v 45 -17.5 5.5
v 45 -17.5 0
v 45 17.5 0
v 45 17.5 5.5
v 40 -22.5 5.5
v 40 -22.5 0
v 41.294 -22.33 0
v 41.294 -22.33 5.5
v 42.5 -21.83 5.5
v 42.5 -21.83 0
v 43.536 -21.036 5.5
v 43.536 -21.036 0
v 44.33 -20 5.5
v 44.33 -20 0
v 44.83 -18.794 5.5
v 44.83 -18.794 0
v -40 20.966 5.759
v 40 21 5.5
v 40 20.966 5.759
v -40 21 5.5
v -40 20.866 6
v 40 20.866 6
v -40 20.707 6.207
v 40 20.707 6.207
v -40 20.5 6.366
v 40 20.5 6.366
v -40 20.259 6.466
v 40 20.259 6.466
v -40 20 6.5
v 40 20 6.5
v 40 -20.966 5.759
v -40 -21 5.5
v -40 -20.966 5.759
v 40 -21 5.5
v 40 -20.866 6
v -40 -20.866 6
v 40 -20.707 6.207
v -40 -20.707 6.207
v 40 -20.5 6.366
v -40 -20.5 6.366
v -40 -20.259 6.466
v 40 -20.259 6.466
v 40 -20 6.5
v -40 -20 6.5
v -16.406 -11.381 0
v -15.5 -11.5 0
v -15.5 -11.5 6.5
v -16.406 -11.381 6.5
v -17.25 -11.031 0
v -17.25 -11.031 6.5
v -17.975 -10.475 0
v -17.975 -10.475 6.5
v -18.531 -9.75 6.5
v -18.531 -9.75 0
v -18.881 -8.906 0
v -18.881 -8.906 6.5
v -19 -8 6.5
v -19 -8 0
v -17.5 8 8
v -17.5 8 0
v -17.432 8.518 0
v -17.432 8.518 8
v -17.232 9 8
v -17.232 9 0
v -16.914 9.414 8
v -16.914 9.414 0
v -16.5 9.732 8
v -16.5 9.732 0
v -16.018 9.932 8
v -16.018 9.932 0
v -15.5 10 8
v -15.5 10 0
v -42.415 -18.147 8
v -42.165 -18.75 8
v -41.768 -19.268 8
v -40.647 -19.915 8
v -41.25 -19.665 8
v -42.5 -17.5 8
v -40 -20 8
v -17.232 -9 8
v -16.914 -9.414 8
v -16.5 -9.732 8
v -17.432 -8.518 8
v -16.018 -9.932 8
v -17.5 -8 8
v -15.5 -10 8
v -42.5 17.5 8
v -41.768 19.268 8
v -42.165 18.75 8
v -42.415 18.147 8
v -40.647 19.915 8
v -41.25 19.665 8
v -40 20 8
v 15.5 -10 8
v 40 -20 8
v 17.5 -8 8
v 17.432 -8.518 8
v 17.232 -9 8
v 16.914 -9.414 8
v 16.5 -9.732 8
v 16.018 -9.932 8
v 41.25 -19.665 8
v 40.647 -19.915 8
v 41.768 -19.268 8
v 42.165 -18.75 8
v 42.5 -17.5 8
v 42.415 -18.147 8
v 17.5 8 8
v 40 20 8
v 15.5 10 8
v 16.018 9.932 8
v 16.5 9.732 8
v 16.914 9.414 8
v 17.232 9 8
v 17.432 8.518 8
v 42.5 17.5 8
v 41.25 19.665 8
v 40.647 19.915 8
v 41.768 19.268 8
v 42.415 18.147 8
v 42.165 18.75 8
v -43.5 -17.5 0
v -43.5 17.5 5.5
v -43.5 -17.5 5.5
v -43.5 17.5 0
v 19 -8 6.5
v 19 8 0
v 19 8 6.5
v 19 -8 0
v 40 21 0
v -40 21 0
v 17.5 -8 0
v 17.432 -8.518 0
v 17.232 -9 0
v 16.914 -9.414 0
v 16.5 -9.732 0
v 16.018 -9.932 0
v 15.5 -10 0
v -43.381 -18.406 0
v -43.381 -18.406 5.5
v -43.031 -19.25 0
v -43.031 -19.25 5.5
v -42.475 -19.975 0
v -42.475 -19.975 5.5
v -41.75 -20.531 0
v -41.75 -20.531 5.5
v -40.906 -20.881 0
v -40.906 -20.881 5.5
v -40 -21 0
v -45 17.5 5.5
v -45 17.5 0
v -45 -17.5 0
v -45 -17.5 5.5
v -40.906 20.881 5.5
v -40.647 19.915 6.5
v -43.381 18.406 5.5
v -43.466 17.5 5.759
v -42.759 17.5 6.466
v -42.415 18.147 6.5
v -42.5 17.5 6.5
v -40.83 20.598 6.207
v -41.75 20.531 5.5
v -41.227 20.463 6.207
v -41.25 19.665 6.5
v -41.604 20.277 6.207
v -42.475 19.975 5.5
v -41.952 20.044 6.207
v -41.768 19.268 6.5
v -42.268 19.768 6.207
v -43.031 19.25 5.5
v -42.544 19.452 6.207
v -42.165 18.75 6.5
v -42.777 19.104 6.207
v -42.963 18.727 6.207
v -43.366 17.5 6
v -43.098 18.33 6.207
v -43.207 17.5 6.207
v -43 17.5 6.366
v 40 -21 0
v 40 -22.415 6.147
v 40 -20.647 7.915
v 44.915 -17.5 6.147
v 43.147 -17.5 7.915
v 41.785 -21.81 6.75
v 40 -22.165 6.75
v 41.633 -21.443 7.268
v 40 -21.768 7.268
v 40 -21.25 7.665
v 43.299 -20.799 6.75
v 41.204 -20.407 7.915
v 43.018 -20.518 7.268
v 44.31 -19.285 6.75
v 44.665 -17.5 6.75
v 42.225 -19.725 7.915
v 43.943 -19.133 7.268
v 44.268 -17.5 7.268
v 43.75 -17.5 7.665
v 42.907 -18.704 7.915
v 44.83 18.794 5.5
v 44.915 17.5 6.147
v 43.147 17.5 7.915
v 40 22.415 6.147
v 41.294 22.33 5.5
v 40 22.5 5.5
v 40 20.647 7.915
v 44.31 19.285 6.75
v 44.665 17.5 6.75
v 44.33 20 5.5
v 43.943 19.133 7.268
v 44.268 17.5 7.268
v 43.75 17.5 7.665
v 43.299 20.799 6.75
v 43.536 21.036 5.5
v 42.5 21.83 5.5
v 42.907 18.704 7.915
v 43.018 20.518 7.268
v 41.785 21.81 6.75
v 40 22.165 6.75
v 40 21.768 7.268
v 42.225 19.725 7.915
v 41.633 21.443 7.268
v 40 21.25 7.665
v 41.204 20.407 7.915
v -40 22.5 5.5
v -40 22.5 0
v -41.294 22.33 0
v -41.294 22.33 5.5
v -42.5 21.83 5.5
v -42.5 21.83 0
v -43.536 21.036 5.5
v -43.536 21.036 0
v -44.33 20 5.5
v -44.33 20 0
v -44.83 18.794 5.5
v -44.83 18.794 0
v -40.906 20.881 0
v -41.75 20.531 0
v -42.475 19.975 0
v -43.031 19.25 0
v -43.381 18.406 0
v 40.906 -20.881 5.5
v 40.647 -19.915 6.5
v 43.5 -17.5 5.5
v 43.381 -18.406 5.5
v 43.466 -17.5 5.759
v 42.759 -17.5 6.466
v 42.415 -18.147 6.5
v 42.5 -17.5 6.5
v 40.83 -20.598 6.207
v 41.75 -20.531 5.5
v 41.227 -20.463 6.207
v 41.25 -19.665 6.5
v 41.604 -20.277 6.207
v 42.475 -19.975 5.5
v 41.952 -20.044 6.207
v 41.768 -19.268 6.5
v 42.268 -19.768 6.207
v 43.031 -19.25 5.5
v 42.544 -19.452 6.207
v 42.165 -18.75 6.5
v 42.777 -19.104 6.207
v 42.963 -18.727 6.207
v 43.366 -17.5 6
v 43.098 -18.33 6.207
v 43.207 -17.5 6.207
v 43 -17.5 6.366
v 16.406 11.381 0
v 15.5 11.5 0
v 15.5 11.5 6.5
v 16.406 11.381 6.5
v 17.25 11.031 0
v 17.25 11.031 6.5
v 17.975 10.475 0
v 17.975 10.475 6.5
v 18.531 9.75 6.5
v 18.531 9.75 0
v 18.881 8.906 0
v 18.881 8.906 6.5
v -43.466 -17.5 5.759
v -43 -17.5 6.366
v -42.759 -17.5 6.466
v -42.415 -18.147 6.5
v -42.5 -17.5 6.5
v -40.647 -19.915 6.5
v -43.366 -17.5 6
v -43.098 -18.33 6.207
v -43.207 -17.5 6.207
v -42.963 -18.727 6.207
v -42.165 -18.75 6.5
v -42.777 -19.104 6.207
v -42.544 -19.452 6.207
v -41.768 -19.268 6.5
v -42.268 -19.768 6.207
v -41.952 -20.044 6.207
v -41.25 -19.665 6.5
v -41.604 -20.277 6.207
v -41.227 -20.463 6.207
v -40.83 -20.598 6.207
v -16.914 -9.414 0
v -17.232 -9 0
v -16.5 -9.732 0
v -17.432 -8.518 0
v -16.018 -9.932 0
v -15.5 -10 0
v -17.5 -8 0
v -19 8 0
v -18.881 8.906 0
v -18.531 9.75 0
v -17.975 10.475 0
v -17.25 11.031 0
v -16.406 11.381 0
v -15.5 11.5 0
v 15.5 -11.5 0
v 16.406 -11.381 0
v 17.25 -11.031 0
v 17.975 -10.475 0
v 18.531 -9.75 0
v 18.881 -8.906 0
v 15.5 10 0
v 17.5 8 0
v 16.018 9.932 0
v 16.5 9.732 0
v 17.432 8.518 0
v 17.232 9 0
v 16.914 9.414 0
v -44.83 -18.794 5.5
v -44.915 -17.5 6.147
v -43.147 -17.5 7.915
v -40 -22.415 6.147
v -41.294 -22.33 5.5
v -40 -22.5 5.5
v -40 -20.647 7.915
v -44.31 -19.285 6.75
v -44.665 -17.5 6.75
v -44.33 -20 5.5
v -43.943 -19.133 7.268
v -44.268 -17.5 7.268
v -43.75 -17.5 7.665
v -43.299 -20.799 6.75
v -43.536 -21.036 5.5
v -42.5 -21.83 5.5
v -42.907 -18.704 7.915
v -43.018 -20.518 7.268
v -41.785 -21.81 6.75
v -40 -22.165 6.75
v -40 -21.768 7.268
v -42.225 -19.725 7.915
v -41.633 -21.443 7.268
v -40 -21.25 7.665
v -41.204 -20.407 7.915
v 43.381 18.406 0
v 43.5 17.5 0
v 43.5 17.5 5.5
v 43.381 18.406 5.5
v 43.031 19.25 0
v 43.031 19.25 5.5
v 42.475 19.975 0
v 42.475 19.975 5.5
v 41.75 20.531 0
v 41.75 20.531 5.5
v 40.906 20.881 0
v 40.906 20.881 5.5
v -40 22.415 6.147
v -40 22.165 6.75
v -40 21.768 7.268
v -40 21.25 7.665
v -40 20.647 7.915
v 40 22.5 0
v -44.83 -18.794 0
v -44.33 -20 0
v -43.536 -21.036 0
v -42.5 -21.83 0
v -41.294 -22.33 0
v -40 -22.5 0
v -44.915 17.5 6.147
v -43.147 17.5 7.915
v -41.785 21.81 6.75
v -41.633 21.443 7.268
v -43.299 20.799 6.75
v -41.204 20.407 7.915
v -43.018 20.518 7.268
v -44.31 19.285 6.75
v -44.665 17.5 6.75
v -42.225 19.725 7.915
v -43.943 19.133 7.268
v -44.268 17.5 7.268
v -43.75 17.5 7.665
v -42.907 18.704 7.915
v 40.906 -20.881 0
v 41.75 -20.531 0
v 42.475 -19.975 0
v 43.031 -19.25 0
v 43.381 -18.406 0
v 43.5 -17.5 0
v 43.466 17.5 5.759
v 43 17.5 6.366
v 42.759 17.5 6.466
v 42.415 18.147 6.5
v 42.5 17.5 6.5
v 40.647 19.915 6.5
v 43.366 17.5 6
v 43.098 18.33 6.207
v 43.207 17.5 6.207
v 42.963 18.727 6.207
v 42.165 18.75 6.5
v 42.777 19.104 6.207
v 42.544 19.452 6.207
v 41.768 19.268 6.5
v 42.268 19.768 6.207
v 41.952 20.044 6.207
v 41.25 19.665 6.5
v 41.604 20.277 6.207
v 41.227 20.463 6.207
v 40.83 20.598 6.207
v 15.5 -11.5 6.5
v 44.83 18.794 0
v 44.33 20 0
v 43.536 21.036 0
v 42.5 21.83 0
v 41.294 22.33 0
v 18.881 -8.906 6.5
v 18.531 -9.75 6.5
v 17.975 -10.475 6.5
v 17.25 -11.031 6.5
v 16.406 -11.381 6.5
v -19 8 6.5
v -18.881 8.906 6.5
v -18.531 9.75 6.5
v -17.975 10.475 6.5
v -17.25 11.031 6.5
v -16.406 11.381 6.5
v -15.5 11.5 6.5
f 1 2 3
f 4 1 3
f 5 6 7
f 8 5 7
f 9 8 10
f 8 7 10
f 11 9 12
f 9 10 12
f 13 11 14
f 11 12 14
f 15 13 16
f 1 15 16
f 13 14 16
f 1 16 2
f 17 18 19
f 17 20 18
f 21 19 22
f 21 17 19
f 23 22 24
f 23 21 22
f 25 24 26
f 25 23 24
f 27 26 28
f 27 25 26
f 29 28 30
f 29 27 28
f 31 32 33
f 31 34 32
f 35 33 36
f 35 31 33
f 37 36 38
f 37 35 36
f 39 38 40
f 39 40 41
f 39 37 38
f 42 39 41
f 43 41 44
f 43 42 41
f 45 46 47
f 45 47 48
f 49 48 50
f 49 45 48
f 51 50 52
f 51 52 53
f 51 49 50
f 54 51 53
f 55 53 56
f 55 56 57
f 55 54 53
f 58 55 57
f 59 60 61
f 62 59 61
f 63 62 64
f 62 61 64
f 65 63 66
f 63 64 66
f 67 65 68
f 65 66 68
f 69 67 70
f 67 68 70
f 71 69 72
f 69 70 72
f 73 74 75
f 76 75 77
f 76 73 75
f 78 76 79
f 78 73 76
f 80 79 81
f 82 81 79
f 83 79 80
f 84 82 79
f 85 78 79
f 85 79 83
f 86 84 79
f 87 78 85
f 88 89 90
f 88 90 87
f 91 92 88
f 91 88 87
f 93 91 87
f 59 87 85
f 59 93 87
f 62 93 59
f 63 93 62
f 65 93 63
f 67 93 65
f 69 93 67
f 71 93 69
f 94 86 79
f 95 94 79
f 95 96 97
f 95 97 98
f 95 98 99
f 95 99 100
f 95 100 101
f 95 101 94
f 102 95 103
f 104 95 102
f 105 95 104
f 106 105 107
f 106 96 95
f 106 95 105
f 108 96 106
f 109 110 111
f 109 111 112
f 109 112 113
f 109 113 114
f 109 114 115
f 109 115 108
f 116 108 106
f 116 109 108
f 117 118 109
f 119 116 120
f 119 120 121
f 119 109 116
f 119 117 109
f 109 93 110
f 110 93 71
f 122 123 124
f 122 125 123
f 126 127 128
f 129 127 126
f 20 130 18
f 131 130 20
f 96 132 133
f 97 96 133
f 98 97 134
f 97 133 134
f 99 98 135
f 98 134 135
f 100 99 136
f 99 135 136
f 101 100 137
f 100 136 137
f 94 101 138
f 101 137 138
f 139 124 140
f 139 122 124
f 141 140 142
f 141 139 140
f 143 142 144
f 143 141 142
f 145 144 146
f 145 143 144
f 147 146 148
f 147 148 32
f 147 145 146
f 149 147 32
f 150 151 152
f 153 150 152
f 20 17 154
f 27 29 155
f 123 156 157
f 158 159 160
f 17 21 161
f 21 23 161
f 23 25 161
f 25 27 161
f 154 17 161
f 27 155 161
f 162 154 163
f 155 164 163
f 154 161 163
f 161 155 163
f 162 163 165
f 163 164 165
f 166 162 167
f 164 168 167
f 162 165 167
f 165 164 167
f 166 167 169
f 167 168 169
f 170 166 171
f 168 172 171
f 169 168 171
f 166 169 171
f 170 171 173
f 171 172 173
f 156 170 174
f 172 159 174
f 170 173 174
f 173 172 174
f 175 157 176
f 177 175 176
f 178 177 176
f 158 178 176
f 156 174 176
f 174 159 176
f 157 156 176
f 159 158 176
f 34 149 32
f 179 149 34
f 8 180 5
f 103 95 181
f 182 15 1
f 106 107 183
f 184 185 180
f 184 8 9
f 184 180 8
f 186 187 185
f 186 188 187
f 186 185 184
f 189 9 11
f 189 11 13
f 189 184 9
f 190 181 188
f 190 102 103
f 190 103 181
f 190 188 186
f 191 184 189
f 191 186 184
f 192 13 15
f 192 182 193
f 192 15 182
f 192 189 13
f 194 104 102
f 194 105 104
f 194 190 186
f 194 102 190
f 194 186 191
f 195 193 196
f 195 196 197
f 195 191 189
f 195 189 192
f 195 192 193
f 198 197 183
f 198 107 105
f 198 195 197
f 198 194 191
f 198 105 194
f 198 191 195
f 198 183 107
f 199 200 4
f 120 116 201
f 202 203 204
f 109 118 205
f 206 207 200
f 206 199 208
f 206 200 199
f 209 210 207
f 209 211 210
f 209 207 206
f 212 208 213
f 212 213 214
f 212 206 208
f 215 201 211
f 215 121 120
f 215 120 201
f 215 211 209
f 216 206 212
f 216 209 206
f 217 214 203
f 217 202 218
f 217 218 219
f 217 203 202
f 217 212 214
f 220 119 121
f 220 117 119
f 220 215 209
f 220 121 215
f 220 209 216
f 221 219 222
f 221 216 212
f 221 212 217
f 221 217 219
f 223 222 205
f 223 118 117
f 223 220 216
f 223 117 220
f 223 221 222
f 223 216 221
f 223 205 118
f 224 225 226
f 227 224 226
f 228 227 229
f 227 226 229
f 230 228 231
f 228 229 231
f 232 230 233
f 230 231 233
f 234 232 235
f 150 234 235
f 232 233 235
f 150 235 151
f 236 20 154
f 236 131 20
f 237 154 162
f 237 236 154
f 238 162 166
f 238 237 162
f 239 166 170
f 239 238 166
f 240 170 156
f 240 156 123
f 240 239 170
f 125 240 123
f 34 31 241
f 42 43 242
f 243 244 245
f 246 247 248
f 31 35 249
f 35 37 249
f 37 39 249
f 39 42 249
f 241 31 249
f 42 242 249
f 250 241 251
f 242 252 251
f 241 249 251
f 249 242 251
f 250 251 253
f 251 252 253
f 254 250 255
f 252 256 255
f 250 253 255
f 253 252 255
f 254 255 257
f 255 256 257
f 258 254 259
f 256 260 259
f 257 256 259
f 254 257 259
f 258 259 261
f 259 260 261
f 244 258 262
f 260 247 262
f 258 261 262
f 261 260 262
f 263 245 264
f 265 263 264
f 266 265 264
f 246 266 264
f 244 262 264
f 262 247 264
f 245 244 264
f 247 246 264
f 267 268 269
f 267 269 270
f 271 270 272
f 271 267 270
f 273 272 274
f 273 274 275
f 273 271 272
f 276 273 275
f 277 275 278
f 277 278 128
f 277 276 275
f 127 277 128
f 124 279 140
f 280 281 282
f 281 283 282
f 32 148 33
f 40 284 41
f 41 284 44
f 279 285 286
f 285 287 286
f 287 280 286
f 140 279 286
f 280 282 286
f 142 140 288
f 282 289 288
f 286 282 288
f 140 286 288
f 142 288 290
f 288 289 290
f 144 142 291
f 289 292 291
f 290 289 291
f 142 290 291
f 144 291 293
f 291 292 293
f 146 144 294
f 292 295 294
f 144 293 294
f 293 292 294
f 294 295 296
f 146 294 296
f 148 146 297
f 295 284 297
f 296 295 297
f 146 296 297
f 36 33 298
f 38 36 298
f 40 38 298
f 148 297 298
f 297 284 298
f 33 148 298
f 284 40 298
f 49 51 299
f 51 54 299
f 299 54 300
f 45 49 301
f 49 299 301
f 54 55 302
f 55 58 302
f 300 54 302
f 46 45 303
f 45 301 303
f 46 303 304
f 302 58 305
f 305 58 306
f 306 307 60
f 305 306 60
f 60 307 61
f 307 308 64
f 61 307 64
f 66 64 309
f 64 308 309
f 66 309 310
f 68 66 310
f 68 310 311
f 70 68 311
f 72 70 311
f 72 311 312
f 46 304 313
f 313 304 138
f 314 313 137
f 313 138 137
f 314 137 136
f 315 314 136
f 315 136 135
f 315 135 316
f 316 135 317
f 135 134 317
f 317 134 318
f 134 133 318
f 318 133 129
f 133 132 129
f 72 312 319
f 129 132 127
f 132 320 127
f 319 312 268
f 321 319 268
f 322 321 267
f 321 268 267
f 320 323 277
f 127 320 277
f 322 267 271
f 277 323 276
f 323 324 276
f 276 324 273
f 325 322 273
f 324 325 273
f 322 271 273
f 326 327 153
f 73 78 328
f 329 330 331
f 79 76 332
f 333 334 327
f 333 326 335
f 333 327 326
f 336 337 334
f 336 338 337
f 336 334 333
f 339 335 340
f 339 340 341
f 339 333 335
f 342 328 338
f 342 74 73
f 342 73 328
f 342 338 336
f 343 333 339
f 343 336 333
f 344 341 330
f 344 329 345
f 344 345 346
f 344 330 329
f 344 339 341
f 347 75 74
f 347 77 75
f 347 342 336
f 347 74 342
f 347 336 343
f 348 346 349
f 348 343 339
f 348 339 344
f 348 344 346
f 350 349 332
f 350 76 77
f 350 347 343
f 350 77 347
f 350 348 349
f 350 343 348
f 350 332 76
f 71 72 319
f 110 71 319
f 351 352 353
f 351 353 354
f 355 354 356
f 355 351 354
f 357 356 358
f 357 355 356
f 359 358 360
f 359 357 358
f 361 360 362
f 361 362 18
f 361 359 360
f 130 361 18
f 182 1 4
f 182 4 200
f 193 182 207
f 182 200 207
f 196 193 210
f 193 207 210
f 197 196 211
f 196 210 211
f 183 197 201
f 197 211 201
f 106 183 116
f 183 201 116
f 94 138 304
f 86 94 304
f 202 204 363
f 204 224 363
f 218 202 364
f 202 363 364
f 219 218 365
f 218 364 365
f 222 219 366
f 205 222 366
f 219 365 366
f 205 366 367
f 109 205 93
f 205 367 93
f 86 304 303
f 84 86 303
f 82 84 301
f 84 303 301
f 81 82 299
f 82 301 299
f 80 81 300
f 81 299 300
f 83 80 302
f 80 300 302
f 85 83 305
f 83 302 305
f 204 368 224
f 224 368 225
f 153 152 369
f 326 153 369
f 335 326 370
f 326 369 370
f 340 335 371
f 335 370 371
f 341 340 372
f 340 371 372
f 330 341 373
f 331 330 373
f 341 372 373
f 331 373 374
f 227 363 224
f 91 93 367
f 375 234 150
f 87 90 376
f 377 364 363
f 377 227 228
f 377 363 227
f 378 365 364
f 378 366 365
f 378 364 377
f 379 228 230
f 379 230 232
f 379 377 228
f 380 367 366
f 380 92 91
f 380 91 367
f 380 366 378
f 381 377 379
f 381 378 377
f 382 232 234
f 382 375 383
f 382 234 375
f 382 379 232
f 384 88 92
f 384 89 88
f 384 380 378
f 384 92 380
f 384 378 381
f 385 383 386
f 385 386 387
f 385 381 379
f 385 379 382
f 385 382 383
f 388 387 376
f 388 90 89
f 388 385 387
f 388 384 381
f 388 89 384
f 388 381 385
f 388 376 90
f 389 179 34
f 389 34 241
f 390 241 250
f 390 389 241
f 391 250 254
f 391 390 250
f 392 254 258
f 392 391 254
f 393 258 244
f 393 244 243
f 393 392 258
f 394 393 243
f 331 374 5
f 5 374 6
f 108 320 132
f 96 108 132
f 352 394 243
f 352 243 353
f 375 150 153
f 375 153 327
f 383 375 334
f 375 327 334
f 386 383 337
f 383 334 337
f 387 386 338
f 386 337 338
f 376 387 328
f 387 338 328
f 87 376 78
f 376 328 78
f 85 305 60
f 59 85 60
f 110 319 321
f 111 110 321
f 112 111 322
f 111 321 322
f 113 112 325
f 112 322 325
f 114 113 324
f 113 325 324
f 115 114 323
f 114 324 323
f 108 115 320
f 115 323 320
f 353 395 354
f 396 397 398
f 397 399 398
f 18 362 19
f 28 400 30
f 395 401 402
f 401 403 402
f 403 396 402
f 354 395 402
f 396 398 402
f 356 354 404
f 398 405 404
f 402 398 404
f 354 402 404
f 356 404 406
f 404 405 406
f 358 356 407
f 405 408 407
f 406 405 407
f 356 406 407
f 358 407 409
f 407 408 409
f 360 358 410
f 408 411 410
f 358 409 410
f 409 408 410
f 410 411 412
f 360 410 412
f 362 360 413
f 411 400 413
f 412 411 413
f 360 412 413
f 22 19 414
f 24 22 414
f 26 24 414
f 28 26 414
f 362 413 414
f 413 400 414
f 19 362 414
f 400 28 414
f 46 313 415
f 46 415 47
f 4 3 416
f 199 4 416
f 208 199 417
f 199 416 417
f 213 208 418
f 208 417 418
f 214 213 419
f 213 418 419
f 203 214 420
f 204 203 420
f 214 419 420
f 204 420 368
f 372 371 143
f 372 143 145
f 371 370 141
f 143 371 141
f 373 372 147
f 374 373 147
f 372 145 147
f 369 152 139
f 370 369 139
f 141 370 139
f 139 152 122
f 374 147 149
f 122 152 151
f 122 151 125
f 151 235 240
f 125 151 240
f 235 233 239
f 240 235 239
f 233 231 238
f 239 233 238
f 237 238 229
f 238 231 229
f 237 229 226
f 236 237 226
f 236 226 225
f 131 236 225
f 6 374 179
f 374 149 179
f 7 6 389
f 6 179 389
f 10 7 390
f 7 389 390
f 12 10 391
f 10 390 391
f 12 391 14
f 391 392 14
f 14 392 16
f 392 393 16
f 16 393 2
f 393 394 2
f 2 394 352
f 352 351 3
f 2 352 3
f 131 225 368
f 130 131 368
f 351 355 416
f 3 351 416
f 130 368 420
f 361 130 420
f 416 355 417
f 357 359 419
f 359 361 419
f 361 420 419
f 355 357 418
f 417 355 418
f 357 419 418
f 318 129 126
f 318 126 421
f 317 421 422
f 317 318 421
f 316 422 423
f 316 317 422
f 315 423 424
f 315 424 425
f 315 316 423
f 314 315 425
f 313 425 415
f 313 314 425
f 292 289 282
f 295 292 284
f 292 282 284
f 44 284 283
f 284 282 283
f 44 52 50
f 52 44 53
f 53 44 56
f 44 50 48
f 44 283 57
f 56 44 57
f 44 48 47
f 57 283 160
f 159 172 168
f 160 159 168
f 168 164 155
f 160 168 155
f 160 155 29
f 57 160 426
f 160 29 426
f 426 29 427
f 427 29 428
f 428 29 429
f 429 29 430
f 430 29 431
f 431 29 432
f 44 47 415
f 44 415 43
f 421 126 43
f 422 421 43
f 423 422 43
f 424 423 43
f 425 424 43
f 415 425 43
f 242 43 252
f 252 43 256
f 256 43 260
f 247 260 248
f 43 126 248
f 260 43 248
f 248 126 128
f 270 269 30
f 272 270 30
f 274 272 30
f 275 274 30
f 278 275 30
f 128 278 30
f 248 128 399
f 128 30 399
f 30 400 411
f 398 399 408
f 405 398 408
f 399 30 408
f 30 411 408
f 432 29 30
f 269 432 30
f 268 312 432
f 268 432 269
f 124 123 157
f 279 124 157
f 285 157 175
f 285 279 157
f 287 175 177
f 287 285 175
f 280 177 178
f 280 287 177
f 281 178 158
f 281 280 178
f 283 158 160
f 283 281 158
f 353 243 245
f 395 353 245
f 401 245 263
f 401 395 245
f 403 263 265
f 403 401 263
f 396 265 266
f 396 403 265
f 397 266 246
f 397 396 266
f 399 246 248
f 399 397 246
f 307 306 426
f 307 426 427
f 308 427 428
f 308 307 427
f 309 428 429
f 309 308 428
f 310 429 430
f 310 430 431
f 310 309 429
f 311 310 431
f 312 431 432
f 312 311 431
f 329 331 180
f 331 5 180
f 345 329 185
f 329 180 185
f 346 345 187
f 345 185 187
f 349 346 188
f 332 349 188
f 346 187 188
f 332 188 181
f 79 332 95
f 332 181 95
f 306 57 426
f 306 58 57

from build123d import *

# Parameters (mm, degrees)
F1_DEPTH = 8
F2_R     = 2.5
F3_T     = -1.5


with BuildPart() as f1:
    # F0 (on Top) → F1 (new body)
    with BuildSketch(Plane.XY):
        with BuildLine():
            Line((40, 22.5), (-40, 22.5))
            ThreePointArc((-40, 22.5), (-43.535534, 21.035534), (-45, 17.5))
            Line((-45, 17.5), (-45, -17.5))
            ThreePointArc((-45, -17.5), (-43.535534, -21.035534), (-40, -22.5))
            Line((-40, -22.5), (40, -22.5))
            ThreePointArc((40, -22.5), (43.535534, -21.035534), (45, -17.5))
            Line((45, -17.5), (45, 17.5))
            ThreePointArc((45, 17.5), (43.535534, 21.035534), (40, 22.5))
        make_face()
        with BuildLine():
            ThreePointArc((-17.5, 8), (-16.914214, 9.414214), (-15.5, 10))
            Line((-15.5, 10), (15.5, 10))
            ThreePointArc((15.5, 10), (16.914214, 9.414214), (17.5, 8))
            Line((17.5, 8), (17.5, -8))
            ThreePointArc((17.5, -8), (16.914214, -9.414214), (15.5, -10))
            Line((15.5, -10), (-15.5, -10))
            ThreePointArc((-15.5, -10), (-16.914214, -9.414214), (-17.5, -8))
            Line((-17.5, -8), (-17.5, 8))
        make_face(mode=Mode.SUBTRACT)
    extrude(amount=F1_DEPTH)

    # F2
    f2_edges = [f1.edges().sort_by_distance(p)[0] for p in [
        (0, -22.5, 8),
    ]]
    fillet(f2_edges, radius=F2_R)

    # F3
    f3_openings = [f1.faces().sort_by_distance(p)[0] for p in [
        (0, 21.493769, 0),
    ]]
    offset(amount=F3_T, openings=f3_openings)


solid = f1.part
